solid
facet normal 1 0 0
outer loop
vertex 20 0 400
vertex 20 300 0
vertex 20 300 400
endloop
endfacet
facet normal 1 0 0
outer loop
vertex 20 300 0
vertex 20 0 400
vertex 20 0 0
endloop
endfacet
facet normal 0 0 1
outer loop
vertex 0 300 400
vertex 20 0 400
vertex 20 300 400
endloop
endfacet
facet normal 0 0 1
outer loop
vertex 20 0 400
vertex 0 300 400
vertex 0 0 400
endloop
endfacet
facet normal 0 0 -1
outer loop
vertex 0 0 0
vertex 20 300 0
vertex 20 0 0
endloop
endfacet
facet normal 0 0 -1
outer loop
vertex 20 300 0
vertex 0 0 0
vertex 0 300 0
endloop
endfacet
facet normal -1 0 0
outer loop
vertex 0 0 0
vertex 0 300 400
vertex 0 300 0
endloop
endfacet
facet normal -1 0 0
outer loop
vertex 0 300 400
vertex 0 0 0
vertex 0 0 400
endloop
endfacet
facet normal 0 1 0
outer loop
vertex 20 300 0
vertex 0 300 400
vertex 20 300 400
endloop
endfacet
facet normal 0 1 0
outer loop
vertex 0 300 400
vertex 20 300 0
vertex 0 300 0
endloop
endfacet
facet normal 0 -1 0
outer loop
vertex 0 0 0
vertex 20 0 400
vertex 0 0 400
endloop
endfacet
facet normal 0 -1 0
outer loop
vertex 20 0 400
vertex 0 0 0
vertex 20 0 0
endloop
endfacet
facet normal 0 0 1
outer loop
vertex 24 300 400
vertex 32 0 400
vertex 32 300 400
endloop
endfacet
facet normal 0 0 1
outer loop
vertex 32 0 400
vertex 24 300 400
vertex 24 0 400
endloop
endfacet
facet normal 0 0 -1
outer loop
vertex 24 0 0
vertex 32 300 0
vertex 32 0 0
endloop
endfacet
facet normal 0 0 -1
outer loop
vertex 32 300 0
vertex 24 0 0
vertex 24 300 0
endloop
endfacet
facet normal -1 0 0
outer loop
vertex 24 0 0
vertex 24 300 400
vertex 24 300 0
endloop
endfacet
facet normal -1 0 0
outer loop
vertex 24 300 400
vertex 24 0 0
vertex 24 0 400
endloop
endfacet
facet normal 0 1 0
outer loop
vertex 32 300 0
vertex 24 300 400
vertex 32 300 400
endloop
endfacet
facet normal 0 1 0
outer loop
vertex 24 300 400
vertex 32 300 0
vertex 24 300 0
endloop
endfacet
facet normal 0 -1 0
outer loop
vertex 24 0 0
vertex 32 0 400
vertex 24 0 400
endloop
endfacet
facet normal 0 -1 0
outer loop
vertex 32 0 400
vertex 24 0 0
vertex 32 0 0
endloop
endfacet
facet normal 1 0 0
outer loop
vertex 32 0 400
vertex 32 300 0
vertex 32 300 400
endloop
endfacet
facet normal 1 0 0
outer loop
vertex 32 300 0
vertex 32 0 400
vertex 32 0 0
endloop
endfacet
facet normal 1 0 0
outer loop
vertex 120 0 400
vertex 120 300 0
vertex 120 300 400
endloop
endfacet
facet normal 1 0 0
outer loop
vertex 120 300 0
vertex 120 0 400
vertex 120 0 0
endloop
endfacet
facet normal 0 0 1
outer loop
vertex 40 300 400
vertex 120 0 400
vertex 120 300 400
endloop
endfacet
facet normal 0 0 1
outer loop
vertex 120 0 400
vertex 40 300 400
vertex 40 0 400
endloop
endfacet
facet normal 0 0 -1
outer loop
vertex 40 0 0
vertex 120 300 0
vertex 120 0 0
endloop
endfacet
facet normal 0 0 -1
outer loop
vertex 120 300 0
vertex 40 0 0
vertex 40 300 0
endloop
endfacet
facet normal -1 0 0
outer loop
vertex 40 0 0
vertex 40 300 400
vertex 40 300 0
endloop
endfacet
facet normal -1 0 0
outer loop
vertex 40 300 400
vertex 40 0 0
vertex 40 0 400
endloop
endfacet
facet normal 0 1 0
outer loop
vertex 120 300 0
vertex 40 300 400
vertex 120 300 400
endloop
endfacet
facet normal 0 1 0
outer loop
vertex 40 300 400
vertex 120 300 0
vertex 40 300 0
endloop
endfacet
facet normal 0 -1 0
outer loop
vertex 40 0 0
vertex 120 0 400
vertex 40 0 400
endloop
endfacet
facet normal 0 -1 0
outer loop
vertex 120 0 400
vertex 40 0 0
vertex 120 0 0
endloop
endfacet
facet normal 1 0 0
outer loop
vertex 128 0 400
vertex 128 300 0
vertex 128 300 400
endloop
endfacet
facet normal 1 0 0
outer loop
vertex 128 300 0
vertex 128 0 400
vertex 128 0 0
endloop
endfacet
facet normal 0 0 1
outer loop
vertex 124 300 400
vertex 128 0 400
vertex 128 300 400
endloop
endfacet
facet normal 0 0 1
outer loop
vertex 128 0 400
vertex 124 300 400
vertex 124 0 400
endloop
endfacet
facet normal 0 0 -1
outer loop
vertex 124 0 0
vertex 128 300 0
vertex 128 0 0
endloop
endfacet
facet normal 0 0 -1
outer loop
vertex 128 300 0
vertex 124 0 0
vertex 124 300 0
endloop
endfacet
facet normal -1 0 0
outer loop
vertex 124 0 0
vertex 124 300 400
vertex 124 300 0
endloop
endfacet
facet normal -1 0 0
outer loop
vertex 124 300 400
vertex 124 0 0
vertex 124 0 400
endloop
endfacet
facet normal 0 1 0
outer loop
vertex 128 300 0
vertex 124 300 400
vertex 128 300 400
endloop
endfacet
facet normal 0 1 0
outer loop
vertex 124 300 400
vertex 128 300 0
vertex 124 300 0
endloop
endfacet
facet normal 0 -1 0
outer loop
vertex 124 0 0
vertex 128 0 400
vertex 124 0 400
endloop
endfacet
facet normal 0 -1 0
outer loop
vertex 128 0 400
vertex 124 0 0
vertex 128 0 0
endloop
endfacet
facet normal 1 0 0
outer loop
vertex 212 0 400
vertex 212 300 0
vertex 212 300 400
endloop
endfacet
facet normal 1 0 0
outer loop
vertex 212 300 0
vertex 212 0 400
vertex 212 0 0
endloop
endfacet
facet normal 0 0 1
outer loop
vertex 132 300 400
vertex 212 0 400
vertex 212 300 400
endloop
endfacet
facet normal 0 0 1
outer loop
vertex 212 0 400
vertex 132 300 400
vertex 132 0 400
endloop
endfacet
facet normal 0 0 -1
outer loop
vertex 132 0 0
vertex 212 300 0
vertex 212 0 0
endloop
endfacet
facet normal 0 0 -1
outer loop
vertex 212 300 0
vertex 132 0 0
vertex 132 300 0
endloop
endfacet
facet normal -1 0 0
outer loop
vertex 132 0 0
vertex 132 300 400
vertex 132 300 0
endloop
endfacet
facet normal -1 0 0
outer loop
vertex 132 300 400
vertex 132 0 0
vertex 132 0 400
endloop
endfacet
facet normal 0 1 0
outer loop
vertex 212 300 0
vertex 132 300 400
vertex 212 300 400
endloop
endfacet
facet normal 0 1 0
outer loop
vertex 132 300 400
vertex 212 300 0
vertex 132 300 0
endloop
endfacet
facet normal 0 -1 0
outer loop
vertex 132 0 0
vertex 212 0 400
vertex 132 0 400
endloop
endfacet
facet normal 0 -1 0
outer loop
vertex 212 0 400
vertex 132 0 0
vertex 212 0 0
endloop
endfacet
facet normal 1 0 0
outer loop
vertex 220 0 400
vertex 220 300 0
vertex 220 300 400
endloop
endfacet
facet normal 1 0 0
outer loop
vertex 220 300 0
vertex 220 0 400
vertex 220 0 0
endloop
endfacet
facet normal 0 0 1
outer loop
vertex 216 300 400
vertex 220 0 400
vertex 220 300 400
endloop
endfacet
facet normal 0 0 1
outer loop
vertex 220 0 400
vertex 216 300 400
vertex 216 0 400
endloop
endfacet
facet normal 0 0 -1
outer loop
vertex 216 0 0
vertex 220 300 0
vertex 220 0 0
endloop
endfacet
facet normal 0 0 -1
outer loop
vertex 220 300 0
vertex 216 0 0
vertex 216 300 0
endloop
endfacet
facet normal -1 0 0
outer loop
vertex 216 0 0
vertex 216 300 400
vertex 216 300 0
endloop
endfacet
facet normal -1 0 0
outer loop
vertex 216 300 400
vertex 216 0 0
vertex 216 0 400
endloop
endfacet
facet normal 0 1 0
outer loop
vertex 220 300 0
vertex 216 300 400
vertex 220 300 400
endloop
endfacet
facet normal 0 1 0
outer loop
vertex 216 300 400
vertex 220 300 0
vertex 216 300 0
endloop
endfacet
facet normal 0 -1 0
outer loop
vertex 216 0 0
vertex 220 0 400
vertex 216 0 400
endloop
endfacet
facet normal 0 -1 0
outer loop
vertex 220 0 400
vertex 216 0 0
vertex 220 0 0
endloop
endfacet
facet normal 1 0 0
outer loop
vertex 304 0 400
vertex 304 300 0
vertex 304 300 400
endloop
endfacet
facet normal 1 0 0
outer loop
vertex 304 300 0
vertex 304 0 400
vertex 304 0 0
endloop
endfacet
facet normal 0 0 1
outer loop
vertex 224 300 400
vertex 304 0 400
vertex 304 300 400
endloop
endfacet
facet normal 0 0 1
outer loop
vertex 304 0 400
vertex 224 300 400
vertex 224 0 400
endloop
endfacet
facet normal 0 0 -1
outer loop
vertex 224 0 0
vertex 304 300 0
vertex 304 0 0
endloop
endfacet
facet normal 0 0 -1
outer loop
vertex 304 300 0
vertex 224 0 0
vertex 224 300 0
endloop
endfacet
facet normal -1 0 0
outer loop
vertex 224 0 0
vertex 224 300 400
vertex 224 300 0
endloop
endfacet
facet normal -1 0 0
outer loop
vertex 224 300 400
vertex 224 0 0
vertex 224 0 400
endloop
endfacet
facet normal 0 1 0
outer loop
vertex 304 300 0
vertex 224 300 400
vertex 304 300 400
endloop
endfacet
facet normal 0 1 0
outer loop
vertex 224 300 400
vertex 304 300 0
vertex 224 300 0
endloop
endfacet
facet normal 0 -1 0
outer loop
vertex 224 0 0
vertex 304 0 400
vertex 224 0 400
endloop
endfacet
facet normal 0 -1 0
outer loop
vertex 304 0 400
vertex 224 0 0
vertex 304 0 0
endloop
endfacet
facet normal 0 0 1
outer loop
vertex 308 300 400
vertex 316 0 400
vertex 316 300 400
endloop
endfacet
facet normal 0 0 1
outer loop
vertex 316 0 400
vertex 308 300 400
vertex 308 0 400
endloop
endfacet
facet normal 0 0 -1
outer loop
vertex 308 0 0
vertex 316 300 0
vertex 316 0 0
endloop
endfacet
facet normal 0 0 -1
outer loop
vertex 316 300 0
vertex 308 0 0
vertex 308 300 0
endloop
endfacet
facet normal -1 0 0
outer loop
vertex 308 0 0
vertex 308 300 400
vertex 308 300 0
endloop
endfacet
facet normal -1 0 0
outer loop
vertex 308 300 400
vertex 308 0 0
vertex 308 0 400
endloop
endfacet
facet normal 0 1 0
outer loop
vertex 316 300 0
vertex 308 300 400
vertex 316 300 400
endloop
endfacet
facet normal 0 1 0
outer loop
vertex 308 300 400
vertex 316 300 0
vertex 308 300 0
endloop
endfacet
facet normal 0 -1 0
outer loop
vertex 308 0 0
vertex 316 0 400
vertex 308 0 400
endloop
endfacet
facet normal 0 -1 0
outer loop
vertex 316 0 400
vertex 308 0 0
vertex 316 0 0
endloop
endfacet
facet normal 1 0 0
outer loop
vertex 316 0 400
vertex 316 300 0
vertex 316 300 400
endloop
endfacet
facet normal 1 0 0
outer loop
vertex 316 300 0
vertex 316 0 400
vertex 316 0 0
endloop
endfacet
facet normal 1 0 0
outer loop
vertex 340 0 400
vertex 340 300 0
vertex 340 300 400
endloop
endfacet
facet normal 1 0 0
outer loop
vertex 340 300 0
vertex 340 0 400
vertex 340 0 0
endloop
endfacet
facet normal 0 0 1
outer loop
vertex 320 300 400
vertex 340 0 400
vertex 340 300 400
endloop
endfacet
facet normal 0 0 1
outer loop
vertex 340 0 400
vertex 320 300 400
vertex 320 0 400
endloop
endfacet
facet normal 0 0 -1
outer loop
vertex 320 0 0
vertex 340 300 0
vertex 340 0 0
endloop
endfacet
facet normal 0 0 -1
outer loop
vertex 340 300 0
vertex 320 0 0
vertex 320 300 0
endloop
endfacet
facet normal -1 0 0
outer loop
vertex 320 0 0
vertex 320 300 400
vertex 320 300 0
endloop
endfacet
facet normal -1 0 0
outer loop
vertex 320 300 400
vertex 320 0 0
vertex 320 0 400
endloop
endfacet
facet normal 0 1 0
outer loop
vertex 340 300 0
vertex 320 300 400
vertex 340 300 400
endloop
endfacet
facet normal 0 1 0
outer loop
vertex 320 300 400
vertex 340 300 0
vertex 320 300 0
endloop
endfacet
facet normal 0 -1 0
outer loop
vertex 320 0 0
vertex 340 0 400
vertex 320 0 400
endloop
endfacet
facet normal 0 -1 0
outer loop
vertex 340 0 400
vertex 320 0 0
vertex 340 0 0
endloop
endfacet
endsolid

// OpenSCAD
// file: ../params.scad
// Shared millimetre parameters. Keep in lockstep with freecad/params.py.
// Module scale: 150 kg/day wet train. Walls are CPVC sheet, not metal.

$fn = 36;

WALL        = 12;     // CPVC sheet thickness
FLOOR       = 16;     // floor plate (trough sits on this)

// LEACH CSTR 1 — inside liquor box
CSTR_L      = 2000;
CSTR_W      = 1200;
CSTR_H      = 1400;   // liquid + freeboard
FREEBOARD   = 200;

// CSTR 2 weir (same vessel, +X wall)
WEIR_W      = 450;
WEIR_CREST  = CSTR_H - FREEBOARD;   // from inner floor
WEIR_SLOT_H = 80;
WEIR_LIP    = 120;    // external spout projection

// CSTR 3 floor auger — injection-molded PVC / FG
AUGER_D     = 140;    // flight OD
AUGER_SHAFT = 40;
AUGER_PITCH = 110;
AUGER_TROUGH_W = 180;
AUGER_TROUGH_H = 110;
AUGER_OFFSET_Y = 280; // trough centreline from inner -Y wall
AUGER_INCLINE  = 28;  // deg, lifts out of liquor toward +X

// mixer / nozzles (lid)
MIXER_D     = 50;
GAS_D       = 80;     // acid-gas takeoff
DROP_X      = 80;     // inner-X of shred drop slot
DROP_L      = 400;
DROP_W      = 250;
DROP_COAM   = 80;     // raised coaming around the slot

// LEACHATE PUMP / coarse strainer — −X wall, opposite the weir
PUMP_D      = 80;     // DN80
PUMP_Z      = 450;    // centreline above inner floor (submerged)
PUMP_Y      = 900;    // centreline from inner −Y (away from auger)
STRAINER_L  = 180;
STRAINER_W  = 140;
STRAINER_H  = 160;

// mezzanine feed train
MEZZ_H      = 2200;   // platform top above tank outer floor
MEZZ_L      = 1600;   // platform length in −X
MEZZ_THK    = 12;
HOPPER_L    = 700;
HOPPER_W    = 600;
HOPPER_H    = 800;
SHRED_L     = 500;
SHRED_W     = 500;
SHRED_H     = 450;
CONV_W      = 240;
CONV_H      = 120;
CONV_PLATE  = 6;      // trough plate
CONV_FLANGE = 40;
CONV_SPRING_D = 50;
CONV_SPRING_H = 80;
CONV_BOLT   = 10;     // M10 clearance
CONV_LEN    = 1800;   // default standalone length; plant instance is computed
DUST_D      = 150;    // dust-hood outlet to DUST header
AUGER_LIFT_L = 700;

// dewater belts + split (Phase A 4–6)
FDEW_L      = 1800;
FDEW_W      = 450;
FDEW_H      = 80;
FDEW_RISE   = 120;    // solids end higher so liquor runs back to weir
SDEW_L      = 1400;
SDEW_W      = 220;
SDEW_H      = 80;
SPLIT_L     = 600;
SPLIT_W     = 500;
SPLIT_H     = 400;
STUB_L      = 400;
STUB_W      = 300;
STUB_H      = 250;

// EW funnel cell
EW_L        = 600;    // along aisle (overflow direction)
EW_W        = 420;    // anode-cathode depth
EW_H        = 650;    // rectangular body
EW_FUNNEL_H = 220;
EW_VALVE_D  = 50;
EW_VALVE_L  = 60;
EW_MEM_T    = 4;      // CEM
EW_SLOT     = 10;     // membrane cassette slot
EW_PITCH    = 750;    // aisle spacing, centre to centre
AISLE_X0    = 200;
AISLE_Y     = -(EW_W + 2*WALL) - 400;
AISLE_Z     = 400;
BUND_H      = 150;
BUND_PAD    = 250;
SUMP_L      = 400;
SUMP_W      = 400;
SUMP_H      = 300;
VDF_D       = 700;
VDF_L       = 900;
PAIL_W      = 180;
HDR_D       = 80;
HDR_Z       = 1400;
PYRO_D      = 320;
PYRO_L      = 2800;

// Campus envelopes — lockstep with freecad/params.py
FARM_X=12000; FARM_Y=8000; FARM_L=12000; FARM_W=8000; FARM_H=4500;
FAB_X=12000;  FAB_Y=-6000; FAB_L=8000;   FAB_W=6000;  FAB_H=4000;
HAB_X=-8000;  HAB_Y=8000;  HAB_L=8000;   HAB_W=6000;  HAB_H=3200;
CRYO_X=-6000; CRYO_Y=-4000; CRYO_L=4000; CRYO_W=3000; CRYO_H=3000;
MFG_X=2000;   MFG_Y=9000;  MFG_L=6000;   MFG_W=4000;  MFG_H=3500;

LIFE_Z_GREY=900; LIFE_Z_UPW=1100; LIFE_Z_ETCH=1300;
LIFE_Z_O2=2800; LIFE_Z_N2=3000; LIFE_Z_CO2=3200;
LIFE_D_GREY=50; LIFE_D_UPW=40; LIFE_D_ETCH=32;
LIFE_D_GAS=25; LIFE_D_CO2=40;
// main file
// One BMED repeating unit: BASE | CEM | SALT | AEM | ACID, BPM at the ends.
include <../params.scad>;

ch = 400;
cw = 300;
gap = 8;
mem = 4;

module plate(c) color(c) cube([mem, cw, ch]);

module unit() {
    x = 0;
    color("lightgray") cube([20, cw, ch]);                 // cathode end
    translate([24, 0, 0]) plate("steelblue");              // BPM CEL toward cathode
    translate([24+mem, 0, 0]) color("orange") cube([mem, cw, ch]); // BPM AEL
    translate([40, 0, 0]) color("ivory") cube([80, cw, ch]); // BASE
    translate([124, 0, 0]) plate("steelblue");             // CEM
    translate([132, 0, 0]) color("beige") cube([80, cw, ch]); // SALT
    translate([216, 0, 0]) plate("orange");                 // AEM
    translate([224, 0, 0]) color("honeydew") cube([80, cw, ch]); // ACID
    translate([308, 0, 0]) color("orange") cube([mem, cw, ch]);
    translate([308+mem, 0, 0]) plate("steelblue");         // BPM, CEL toward next cathode
    translate([320, 0, 0]) color("lightgray") cube([20, cw, ch]);
}

unit();
